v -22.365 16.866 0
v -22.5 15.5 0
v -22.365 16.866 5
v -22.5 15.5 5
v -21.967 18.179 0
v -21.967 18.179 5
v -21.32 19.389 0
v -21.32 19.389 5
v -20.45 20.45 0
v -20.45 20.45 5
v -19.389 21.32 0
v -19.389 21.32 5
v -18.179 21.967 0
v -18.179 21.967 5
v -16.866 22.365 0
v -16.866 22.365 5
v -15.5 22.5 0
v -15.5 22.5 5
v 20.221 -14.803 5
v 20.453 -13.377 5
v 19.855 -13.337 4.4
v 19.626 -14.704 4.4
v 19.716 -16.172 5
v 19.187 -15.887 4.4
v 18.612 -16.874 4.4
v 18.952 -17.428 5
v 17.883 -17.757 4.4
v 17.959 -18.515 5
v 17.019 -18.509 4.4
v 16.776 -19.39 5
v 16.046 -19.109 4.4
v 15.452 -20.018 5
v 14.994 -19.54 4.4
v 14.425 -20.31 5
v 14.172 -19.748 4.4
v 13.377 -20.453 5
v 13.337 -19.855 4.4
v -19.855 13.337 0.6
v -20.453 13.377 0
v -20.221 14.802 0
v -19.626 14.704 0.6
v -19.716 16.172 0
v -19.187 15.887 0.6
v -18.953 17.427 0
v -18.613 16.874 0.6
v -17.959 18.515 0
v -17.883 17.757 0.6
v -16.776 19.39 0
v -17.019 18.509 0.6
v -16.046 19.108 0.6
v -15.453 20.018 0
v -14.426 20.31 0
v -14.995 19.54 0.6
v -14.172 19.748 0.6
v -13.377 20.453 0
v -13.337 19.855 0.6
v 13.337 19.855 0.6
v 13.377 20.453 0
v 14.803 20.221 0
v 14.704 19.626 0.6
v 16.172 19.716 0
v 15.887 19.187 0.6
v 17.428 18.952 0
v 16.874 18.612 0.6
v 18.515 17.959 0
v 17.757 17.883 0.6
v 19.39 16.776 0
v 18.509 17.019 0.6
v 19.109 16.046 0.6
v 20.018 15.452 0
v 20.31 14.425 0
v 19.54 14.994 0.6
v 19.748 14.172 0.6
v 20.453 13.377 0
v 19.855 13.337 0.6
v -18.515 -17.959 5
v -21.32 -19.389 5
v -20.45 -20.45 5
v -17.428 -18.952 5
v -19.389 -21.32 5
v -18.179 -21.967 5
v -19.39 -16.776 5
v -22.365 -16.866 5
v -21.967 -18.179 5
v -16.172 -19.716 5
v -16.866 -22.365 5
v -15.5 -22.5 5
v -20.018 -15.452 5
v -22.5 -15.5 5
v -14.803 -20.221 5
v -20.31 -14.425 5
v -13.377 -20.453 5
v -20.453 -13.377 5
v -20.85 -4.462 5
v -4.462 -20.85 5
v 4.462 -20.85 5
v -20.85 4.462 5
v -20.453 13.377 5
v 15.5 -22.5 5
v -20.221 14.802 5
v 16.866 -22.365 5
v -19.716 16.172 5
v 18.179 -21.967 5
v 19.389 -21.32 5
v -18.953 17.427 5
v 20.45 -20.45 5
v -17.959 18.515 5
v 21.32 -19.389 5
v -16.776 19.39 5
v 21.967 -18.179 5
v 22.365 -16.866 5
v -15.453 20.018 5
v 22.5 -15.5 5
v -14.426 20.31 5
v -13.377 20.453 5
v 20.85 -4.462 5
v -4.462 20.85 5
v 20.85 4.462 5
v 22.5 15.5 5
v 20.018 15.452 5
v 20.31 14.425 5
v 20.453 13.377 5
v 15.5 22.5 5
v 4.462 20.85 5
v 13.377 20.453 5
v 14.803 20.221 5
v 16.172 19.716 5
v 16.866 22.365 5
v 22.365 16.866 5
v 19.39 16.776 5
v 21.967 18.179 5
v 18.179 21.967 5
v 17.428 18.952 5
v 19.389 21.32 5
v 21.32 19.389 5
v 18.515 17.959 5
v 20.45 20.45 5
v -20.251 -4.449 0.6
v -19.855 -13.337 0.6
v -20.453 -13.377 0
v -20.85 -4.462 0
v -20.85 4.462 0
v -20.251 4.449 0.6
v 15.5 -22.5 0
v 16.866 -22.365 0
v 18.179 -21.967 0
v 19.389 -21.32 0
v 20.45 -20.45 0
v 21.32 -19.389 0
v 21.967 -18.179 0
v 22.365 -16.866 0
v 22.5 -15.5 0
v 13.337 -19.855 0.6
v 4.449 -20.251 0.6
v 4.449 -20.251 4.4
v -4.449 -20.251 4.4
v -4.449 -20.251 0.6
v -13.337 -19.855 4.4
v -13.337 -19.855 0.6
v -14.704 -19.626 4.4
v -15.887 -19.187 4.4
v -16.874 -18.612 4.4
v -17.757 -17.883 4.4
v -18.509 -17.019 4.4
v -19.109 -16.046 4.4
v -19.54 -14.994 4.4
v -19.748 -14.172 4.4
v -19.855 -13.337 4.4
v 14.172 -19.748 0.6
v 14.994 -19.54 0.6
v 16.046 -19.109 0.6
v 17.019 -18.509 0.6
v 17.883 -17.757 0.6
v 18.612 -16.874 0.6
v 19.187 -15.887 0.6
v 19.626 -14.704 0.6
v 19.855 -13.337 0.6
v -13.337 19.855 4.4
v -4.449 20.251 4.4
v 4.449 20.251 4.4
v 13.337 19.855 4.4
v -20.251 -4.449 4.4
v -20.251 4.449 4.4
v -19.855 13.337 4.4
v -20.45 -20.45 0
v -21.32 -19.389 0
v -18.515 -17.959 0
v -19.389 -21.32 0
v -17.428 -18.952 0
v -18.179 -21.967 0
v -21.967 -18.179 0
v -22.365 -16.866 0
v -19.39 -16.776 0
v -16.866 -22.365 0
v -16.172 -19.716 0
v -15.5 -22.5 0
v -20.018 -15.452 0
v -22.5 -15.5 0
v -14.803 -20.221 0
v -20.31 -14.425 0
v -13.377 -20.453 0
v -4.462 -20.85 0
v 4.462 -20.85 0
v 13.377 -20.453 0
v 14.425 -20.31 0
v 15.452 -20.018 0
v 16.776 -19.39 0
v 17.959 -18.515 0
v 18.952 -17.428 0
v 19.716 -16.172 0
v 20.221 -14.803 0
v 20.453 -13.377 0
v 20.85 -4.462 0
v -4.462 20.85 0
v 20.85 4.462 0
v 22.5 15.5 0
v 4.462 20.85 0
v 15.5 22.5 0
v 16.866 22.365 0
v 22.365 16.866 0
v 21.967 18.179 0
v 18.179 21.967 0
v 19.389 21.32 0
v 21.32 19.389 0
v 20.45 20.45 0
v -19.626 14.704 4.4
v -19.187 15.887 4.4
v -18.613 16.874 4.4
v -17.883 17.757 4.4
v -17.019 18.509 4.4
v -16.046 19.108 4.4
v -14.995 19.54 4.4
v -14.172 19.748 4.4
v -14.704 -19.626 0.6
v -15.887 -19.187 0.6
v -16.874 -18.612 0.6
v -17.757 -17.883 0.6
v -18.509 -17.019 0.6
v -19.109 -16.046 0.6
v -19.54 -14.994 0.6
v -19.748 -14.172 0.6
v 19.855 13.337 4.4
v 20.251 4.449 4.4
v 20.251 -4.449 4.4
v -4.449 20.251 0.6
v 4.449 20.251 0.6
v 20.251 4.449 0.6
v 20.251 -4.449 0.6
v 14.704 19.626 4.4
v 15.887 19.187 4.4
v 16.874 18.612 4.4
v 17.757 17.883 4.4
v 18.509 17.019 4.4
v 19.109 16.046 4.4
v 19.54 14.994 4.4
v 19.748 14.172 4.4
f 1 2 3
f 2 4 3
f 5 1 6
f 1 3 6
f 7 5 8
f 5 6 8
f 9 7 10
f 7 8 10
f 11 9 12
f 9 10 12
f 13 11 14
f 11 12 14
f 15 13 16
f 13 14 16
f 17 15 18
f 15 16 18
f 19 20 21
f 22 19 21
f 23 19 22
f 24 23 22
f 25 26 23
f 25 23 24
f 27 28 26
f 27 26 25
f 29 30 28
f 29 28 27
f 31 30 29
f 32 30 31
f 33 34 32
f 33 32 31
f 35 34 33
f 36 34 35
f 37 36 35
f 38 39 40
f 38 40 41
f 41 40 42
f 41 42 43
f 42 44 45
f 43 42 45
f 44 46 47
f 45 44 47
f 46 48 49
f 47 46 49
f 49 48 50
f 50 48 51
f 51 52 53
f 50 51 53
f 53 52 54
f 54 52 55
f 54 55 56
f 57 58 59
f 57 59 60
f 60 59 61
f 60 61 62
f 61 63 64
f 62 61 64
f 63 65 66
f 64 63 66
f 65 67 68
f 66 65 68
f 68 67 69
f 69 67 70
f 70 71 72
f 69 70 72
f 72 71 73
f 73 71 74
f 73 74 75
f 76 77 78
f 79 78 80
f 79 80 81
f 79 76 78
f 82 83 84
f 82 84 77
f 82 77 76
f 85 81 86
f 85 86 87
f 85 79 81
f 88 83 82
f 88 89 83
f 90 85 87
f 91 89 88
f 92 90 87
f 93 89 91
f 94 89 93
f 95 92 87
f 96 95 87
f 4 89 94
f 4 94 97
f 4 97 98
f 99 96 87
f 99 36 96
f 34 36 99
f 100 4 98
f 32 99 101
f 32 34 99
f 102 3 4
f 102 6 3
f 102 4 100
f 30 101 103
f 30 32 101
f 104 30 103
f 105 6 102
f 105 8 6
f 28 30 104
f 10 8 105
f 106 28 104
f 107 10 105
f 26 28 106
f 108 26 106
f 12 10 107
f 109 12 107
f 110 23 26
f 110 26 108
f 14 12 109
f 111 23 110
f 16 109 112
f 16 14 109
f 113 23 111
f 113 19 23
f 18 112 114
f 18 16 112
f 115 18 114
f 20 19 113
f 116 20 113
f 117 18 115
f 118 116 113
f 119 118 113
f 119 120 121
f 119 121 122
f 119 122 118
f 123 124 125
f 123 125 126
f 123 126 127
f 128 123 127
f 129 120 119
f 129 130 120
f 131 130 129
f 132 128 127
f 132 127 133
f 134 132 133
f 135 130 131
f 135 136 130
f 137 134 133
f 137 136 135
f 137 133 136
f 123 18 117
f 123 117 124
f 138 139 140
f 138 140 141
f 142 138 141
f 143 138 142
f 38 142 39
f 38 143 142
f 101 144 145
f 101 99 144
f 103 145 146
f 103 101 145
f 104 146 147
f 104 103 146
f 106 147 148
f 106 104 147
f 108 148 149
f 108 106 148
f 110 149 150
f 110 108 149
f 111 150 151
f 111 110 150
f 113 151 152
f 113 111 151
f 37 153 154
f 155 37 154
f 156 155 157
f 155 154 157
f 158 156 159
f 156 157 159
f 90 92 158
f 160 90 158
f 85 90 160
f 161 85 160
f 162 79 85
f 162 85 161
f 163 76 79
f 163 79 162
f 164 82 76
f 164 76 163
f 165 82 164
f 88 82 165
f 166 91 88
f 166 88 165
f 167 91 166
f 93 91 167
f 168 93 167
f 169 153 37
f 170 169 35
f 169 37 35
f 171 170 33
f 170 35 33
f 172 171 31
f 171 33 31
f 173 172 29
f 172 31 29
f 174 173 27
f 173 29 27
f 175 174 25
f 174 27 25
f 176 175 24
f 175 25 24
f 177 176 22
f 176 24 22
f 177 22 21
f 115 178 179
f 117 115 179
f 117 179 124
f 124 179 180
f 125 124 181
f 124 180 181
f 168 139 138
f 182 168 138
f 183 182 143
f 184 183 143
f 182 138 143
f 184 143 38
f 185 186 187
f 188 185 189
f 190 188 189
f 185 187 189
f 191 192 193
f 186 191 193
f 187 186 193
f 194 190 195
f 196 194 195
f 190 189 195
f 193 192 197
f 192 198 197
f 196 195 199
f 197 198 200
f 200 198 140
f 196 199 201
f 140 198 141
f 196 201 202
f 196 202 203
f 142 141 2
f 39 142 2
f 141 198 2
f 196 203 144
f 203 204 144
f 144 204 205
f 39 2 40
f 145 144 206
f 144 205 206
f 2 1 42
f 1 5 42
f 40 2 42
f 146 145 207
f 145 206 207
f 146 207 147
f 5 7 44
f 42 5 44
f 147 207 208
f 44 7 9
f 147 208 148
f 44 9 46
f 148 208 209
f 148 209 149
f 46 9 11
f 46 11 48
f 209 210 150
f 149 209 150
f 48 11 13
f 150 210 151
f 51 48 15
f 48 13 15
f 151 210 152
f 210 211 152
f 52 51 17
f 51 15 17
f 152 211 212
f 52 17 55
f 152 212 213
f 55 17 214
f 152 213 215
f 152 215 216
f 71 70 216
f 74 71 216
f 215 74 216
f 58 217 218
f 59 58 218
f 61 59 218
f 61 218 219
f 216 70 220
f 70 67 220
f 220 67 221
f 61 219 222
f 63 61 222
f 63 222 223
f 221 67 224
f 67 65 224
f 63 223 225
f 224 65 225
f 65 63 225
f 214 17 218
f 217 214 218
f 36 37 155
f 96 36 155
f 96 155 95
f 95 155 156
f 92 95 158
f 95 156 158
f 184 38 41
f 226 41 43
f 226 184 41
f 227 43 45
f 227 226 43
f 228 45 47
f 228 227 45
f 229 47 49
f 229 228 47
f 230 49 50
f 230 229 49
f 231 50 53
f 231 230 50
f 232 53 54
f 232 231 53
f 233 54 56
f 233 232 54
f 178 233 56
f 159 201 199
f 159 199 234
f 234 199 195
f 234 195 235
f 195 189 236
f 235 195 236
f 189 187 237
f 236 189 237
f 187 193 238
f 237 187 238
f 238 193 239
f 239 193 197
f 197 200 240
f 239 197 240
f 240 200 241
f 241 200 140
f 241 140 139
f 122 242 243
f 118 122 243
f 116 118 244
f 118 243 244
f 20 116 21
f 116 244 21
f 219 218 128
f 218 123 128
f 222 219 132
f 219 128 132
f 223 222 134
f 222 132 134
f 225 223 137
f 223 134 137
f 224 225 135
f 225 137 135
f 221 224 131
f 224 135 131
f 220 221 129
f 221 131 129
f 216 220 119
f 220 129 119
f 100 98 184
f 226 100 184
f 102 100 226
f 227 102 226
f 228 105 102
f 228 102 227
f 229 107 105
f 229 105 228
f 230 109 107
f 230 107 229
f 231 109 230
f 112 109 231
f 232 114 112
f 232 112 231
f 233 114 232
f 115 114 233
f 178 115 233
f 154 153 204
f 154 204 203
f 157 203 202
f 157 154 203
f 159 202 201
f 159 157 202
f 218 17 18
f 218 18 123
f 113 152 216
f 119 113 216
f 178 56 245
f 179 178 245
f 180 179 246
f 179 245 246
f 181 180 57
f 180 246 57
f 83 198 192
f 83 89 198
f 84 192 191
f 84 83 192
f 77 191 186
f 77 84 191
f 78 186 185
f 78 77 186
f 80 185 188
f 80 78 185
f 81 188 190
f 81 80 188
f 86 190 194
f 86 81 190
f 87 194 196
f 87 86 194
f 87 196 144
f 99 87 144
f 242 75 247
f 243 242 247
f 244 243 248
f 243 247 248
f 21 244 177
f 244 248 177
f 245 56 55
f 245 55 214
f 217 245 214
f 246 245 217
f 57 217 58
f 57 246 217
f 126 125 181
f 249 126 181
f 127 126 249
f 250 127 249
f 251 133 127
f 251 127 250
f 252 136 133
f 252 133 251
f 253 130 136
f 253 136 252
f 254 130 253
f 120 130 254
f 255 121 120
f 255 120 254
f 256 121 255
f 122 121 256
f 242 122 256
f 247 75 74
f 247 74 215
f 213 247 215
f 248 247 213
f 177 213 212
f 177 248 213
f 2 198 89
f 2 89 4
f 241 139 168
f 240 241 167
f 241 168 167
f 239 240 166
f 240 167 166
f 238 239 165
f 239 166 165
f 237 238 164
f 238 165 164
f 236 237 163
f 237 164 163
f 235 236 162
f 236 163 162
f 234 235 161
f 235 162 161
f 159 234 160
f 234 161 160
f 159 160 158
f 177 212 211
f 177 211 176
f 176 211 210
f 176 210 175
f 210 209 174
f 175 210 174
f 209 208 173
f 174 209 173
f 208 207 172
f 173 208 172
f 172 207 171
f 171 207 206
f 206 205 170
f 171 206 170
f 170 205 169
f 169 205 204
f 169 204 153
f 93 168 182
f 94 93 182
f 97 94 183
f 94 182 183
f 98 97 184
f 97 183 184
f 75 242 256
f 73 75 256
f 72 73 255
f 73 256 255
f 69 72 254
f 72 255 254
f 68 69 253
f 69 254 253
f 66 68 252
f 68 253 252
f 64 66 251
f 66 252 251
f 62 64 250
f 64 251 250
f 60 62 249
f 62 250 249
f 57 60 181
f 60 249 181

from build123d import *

# Parameters (mm, degrees)
F0_W     = 45
F0_H     = 45
F1_DEPTH = 5
F2_R     = 7
F3_SIZE  = 0.6


with BuildPart() as f1:
    # F0 (on Top) → F1 (new body)
    with BuildSketch(Plane.XY):
        Rectangle(F0_W, F0_H)
        with BuildLine():
            ThreePointArc((-19.360702, 19.360702), (0, 20.3), (19.360702, 19.360702))
            ThreePointArc((19.360702, 19.360702), (20.3, 0), (19.360702, -19.360702))
            ThreePointArc((19.360702, -19.360702), (0, -20.3), (-19.360702, -19.360702))
            ThreePointArc((-19.360702, -19.360702), (-20.3, 0), (-19.360702, 19.360702))
        make_face(mode=Mode.SUBTRACT)
    extrude(amount=F1_DEPTH)

    # F2
    f2_edges = [f1.edges().sort_by_distance(p)[0] for p in [
        (-19.360702, 19.360702, 2.5),
        (19.360702, 19.360702, 2.5),
        (19.360702, -19.360702, 2.5),
        (-19.360702, -19.360702, 2.5),
        (-22.5, 22.5, 2.5),
        (22.5, 22.5, 2.5),
        (22.5, -22.5, 2.5),
        (-22.5, -22.5, 2.5),
    ]]
    fillet(f2_edges, radius=F2_R)

    # F3
    f3_edges = [f1.edges().sort_by_distance(p)[0] for p in [
        (-20.3, 0, 5),
        (-20.3, 0, 0),
    ]]
    chamfer(f3_edges, length=F3_SIZE)


solid = f1.part
